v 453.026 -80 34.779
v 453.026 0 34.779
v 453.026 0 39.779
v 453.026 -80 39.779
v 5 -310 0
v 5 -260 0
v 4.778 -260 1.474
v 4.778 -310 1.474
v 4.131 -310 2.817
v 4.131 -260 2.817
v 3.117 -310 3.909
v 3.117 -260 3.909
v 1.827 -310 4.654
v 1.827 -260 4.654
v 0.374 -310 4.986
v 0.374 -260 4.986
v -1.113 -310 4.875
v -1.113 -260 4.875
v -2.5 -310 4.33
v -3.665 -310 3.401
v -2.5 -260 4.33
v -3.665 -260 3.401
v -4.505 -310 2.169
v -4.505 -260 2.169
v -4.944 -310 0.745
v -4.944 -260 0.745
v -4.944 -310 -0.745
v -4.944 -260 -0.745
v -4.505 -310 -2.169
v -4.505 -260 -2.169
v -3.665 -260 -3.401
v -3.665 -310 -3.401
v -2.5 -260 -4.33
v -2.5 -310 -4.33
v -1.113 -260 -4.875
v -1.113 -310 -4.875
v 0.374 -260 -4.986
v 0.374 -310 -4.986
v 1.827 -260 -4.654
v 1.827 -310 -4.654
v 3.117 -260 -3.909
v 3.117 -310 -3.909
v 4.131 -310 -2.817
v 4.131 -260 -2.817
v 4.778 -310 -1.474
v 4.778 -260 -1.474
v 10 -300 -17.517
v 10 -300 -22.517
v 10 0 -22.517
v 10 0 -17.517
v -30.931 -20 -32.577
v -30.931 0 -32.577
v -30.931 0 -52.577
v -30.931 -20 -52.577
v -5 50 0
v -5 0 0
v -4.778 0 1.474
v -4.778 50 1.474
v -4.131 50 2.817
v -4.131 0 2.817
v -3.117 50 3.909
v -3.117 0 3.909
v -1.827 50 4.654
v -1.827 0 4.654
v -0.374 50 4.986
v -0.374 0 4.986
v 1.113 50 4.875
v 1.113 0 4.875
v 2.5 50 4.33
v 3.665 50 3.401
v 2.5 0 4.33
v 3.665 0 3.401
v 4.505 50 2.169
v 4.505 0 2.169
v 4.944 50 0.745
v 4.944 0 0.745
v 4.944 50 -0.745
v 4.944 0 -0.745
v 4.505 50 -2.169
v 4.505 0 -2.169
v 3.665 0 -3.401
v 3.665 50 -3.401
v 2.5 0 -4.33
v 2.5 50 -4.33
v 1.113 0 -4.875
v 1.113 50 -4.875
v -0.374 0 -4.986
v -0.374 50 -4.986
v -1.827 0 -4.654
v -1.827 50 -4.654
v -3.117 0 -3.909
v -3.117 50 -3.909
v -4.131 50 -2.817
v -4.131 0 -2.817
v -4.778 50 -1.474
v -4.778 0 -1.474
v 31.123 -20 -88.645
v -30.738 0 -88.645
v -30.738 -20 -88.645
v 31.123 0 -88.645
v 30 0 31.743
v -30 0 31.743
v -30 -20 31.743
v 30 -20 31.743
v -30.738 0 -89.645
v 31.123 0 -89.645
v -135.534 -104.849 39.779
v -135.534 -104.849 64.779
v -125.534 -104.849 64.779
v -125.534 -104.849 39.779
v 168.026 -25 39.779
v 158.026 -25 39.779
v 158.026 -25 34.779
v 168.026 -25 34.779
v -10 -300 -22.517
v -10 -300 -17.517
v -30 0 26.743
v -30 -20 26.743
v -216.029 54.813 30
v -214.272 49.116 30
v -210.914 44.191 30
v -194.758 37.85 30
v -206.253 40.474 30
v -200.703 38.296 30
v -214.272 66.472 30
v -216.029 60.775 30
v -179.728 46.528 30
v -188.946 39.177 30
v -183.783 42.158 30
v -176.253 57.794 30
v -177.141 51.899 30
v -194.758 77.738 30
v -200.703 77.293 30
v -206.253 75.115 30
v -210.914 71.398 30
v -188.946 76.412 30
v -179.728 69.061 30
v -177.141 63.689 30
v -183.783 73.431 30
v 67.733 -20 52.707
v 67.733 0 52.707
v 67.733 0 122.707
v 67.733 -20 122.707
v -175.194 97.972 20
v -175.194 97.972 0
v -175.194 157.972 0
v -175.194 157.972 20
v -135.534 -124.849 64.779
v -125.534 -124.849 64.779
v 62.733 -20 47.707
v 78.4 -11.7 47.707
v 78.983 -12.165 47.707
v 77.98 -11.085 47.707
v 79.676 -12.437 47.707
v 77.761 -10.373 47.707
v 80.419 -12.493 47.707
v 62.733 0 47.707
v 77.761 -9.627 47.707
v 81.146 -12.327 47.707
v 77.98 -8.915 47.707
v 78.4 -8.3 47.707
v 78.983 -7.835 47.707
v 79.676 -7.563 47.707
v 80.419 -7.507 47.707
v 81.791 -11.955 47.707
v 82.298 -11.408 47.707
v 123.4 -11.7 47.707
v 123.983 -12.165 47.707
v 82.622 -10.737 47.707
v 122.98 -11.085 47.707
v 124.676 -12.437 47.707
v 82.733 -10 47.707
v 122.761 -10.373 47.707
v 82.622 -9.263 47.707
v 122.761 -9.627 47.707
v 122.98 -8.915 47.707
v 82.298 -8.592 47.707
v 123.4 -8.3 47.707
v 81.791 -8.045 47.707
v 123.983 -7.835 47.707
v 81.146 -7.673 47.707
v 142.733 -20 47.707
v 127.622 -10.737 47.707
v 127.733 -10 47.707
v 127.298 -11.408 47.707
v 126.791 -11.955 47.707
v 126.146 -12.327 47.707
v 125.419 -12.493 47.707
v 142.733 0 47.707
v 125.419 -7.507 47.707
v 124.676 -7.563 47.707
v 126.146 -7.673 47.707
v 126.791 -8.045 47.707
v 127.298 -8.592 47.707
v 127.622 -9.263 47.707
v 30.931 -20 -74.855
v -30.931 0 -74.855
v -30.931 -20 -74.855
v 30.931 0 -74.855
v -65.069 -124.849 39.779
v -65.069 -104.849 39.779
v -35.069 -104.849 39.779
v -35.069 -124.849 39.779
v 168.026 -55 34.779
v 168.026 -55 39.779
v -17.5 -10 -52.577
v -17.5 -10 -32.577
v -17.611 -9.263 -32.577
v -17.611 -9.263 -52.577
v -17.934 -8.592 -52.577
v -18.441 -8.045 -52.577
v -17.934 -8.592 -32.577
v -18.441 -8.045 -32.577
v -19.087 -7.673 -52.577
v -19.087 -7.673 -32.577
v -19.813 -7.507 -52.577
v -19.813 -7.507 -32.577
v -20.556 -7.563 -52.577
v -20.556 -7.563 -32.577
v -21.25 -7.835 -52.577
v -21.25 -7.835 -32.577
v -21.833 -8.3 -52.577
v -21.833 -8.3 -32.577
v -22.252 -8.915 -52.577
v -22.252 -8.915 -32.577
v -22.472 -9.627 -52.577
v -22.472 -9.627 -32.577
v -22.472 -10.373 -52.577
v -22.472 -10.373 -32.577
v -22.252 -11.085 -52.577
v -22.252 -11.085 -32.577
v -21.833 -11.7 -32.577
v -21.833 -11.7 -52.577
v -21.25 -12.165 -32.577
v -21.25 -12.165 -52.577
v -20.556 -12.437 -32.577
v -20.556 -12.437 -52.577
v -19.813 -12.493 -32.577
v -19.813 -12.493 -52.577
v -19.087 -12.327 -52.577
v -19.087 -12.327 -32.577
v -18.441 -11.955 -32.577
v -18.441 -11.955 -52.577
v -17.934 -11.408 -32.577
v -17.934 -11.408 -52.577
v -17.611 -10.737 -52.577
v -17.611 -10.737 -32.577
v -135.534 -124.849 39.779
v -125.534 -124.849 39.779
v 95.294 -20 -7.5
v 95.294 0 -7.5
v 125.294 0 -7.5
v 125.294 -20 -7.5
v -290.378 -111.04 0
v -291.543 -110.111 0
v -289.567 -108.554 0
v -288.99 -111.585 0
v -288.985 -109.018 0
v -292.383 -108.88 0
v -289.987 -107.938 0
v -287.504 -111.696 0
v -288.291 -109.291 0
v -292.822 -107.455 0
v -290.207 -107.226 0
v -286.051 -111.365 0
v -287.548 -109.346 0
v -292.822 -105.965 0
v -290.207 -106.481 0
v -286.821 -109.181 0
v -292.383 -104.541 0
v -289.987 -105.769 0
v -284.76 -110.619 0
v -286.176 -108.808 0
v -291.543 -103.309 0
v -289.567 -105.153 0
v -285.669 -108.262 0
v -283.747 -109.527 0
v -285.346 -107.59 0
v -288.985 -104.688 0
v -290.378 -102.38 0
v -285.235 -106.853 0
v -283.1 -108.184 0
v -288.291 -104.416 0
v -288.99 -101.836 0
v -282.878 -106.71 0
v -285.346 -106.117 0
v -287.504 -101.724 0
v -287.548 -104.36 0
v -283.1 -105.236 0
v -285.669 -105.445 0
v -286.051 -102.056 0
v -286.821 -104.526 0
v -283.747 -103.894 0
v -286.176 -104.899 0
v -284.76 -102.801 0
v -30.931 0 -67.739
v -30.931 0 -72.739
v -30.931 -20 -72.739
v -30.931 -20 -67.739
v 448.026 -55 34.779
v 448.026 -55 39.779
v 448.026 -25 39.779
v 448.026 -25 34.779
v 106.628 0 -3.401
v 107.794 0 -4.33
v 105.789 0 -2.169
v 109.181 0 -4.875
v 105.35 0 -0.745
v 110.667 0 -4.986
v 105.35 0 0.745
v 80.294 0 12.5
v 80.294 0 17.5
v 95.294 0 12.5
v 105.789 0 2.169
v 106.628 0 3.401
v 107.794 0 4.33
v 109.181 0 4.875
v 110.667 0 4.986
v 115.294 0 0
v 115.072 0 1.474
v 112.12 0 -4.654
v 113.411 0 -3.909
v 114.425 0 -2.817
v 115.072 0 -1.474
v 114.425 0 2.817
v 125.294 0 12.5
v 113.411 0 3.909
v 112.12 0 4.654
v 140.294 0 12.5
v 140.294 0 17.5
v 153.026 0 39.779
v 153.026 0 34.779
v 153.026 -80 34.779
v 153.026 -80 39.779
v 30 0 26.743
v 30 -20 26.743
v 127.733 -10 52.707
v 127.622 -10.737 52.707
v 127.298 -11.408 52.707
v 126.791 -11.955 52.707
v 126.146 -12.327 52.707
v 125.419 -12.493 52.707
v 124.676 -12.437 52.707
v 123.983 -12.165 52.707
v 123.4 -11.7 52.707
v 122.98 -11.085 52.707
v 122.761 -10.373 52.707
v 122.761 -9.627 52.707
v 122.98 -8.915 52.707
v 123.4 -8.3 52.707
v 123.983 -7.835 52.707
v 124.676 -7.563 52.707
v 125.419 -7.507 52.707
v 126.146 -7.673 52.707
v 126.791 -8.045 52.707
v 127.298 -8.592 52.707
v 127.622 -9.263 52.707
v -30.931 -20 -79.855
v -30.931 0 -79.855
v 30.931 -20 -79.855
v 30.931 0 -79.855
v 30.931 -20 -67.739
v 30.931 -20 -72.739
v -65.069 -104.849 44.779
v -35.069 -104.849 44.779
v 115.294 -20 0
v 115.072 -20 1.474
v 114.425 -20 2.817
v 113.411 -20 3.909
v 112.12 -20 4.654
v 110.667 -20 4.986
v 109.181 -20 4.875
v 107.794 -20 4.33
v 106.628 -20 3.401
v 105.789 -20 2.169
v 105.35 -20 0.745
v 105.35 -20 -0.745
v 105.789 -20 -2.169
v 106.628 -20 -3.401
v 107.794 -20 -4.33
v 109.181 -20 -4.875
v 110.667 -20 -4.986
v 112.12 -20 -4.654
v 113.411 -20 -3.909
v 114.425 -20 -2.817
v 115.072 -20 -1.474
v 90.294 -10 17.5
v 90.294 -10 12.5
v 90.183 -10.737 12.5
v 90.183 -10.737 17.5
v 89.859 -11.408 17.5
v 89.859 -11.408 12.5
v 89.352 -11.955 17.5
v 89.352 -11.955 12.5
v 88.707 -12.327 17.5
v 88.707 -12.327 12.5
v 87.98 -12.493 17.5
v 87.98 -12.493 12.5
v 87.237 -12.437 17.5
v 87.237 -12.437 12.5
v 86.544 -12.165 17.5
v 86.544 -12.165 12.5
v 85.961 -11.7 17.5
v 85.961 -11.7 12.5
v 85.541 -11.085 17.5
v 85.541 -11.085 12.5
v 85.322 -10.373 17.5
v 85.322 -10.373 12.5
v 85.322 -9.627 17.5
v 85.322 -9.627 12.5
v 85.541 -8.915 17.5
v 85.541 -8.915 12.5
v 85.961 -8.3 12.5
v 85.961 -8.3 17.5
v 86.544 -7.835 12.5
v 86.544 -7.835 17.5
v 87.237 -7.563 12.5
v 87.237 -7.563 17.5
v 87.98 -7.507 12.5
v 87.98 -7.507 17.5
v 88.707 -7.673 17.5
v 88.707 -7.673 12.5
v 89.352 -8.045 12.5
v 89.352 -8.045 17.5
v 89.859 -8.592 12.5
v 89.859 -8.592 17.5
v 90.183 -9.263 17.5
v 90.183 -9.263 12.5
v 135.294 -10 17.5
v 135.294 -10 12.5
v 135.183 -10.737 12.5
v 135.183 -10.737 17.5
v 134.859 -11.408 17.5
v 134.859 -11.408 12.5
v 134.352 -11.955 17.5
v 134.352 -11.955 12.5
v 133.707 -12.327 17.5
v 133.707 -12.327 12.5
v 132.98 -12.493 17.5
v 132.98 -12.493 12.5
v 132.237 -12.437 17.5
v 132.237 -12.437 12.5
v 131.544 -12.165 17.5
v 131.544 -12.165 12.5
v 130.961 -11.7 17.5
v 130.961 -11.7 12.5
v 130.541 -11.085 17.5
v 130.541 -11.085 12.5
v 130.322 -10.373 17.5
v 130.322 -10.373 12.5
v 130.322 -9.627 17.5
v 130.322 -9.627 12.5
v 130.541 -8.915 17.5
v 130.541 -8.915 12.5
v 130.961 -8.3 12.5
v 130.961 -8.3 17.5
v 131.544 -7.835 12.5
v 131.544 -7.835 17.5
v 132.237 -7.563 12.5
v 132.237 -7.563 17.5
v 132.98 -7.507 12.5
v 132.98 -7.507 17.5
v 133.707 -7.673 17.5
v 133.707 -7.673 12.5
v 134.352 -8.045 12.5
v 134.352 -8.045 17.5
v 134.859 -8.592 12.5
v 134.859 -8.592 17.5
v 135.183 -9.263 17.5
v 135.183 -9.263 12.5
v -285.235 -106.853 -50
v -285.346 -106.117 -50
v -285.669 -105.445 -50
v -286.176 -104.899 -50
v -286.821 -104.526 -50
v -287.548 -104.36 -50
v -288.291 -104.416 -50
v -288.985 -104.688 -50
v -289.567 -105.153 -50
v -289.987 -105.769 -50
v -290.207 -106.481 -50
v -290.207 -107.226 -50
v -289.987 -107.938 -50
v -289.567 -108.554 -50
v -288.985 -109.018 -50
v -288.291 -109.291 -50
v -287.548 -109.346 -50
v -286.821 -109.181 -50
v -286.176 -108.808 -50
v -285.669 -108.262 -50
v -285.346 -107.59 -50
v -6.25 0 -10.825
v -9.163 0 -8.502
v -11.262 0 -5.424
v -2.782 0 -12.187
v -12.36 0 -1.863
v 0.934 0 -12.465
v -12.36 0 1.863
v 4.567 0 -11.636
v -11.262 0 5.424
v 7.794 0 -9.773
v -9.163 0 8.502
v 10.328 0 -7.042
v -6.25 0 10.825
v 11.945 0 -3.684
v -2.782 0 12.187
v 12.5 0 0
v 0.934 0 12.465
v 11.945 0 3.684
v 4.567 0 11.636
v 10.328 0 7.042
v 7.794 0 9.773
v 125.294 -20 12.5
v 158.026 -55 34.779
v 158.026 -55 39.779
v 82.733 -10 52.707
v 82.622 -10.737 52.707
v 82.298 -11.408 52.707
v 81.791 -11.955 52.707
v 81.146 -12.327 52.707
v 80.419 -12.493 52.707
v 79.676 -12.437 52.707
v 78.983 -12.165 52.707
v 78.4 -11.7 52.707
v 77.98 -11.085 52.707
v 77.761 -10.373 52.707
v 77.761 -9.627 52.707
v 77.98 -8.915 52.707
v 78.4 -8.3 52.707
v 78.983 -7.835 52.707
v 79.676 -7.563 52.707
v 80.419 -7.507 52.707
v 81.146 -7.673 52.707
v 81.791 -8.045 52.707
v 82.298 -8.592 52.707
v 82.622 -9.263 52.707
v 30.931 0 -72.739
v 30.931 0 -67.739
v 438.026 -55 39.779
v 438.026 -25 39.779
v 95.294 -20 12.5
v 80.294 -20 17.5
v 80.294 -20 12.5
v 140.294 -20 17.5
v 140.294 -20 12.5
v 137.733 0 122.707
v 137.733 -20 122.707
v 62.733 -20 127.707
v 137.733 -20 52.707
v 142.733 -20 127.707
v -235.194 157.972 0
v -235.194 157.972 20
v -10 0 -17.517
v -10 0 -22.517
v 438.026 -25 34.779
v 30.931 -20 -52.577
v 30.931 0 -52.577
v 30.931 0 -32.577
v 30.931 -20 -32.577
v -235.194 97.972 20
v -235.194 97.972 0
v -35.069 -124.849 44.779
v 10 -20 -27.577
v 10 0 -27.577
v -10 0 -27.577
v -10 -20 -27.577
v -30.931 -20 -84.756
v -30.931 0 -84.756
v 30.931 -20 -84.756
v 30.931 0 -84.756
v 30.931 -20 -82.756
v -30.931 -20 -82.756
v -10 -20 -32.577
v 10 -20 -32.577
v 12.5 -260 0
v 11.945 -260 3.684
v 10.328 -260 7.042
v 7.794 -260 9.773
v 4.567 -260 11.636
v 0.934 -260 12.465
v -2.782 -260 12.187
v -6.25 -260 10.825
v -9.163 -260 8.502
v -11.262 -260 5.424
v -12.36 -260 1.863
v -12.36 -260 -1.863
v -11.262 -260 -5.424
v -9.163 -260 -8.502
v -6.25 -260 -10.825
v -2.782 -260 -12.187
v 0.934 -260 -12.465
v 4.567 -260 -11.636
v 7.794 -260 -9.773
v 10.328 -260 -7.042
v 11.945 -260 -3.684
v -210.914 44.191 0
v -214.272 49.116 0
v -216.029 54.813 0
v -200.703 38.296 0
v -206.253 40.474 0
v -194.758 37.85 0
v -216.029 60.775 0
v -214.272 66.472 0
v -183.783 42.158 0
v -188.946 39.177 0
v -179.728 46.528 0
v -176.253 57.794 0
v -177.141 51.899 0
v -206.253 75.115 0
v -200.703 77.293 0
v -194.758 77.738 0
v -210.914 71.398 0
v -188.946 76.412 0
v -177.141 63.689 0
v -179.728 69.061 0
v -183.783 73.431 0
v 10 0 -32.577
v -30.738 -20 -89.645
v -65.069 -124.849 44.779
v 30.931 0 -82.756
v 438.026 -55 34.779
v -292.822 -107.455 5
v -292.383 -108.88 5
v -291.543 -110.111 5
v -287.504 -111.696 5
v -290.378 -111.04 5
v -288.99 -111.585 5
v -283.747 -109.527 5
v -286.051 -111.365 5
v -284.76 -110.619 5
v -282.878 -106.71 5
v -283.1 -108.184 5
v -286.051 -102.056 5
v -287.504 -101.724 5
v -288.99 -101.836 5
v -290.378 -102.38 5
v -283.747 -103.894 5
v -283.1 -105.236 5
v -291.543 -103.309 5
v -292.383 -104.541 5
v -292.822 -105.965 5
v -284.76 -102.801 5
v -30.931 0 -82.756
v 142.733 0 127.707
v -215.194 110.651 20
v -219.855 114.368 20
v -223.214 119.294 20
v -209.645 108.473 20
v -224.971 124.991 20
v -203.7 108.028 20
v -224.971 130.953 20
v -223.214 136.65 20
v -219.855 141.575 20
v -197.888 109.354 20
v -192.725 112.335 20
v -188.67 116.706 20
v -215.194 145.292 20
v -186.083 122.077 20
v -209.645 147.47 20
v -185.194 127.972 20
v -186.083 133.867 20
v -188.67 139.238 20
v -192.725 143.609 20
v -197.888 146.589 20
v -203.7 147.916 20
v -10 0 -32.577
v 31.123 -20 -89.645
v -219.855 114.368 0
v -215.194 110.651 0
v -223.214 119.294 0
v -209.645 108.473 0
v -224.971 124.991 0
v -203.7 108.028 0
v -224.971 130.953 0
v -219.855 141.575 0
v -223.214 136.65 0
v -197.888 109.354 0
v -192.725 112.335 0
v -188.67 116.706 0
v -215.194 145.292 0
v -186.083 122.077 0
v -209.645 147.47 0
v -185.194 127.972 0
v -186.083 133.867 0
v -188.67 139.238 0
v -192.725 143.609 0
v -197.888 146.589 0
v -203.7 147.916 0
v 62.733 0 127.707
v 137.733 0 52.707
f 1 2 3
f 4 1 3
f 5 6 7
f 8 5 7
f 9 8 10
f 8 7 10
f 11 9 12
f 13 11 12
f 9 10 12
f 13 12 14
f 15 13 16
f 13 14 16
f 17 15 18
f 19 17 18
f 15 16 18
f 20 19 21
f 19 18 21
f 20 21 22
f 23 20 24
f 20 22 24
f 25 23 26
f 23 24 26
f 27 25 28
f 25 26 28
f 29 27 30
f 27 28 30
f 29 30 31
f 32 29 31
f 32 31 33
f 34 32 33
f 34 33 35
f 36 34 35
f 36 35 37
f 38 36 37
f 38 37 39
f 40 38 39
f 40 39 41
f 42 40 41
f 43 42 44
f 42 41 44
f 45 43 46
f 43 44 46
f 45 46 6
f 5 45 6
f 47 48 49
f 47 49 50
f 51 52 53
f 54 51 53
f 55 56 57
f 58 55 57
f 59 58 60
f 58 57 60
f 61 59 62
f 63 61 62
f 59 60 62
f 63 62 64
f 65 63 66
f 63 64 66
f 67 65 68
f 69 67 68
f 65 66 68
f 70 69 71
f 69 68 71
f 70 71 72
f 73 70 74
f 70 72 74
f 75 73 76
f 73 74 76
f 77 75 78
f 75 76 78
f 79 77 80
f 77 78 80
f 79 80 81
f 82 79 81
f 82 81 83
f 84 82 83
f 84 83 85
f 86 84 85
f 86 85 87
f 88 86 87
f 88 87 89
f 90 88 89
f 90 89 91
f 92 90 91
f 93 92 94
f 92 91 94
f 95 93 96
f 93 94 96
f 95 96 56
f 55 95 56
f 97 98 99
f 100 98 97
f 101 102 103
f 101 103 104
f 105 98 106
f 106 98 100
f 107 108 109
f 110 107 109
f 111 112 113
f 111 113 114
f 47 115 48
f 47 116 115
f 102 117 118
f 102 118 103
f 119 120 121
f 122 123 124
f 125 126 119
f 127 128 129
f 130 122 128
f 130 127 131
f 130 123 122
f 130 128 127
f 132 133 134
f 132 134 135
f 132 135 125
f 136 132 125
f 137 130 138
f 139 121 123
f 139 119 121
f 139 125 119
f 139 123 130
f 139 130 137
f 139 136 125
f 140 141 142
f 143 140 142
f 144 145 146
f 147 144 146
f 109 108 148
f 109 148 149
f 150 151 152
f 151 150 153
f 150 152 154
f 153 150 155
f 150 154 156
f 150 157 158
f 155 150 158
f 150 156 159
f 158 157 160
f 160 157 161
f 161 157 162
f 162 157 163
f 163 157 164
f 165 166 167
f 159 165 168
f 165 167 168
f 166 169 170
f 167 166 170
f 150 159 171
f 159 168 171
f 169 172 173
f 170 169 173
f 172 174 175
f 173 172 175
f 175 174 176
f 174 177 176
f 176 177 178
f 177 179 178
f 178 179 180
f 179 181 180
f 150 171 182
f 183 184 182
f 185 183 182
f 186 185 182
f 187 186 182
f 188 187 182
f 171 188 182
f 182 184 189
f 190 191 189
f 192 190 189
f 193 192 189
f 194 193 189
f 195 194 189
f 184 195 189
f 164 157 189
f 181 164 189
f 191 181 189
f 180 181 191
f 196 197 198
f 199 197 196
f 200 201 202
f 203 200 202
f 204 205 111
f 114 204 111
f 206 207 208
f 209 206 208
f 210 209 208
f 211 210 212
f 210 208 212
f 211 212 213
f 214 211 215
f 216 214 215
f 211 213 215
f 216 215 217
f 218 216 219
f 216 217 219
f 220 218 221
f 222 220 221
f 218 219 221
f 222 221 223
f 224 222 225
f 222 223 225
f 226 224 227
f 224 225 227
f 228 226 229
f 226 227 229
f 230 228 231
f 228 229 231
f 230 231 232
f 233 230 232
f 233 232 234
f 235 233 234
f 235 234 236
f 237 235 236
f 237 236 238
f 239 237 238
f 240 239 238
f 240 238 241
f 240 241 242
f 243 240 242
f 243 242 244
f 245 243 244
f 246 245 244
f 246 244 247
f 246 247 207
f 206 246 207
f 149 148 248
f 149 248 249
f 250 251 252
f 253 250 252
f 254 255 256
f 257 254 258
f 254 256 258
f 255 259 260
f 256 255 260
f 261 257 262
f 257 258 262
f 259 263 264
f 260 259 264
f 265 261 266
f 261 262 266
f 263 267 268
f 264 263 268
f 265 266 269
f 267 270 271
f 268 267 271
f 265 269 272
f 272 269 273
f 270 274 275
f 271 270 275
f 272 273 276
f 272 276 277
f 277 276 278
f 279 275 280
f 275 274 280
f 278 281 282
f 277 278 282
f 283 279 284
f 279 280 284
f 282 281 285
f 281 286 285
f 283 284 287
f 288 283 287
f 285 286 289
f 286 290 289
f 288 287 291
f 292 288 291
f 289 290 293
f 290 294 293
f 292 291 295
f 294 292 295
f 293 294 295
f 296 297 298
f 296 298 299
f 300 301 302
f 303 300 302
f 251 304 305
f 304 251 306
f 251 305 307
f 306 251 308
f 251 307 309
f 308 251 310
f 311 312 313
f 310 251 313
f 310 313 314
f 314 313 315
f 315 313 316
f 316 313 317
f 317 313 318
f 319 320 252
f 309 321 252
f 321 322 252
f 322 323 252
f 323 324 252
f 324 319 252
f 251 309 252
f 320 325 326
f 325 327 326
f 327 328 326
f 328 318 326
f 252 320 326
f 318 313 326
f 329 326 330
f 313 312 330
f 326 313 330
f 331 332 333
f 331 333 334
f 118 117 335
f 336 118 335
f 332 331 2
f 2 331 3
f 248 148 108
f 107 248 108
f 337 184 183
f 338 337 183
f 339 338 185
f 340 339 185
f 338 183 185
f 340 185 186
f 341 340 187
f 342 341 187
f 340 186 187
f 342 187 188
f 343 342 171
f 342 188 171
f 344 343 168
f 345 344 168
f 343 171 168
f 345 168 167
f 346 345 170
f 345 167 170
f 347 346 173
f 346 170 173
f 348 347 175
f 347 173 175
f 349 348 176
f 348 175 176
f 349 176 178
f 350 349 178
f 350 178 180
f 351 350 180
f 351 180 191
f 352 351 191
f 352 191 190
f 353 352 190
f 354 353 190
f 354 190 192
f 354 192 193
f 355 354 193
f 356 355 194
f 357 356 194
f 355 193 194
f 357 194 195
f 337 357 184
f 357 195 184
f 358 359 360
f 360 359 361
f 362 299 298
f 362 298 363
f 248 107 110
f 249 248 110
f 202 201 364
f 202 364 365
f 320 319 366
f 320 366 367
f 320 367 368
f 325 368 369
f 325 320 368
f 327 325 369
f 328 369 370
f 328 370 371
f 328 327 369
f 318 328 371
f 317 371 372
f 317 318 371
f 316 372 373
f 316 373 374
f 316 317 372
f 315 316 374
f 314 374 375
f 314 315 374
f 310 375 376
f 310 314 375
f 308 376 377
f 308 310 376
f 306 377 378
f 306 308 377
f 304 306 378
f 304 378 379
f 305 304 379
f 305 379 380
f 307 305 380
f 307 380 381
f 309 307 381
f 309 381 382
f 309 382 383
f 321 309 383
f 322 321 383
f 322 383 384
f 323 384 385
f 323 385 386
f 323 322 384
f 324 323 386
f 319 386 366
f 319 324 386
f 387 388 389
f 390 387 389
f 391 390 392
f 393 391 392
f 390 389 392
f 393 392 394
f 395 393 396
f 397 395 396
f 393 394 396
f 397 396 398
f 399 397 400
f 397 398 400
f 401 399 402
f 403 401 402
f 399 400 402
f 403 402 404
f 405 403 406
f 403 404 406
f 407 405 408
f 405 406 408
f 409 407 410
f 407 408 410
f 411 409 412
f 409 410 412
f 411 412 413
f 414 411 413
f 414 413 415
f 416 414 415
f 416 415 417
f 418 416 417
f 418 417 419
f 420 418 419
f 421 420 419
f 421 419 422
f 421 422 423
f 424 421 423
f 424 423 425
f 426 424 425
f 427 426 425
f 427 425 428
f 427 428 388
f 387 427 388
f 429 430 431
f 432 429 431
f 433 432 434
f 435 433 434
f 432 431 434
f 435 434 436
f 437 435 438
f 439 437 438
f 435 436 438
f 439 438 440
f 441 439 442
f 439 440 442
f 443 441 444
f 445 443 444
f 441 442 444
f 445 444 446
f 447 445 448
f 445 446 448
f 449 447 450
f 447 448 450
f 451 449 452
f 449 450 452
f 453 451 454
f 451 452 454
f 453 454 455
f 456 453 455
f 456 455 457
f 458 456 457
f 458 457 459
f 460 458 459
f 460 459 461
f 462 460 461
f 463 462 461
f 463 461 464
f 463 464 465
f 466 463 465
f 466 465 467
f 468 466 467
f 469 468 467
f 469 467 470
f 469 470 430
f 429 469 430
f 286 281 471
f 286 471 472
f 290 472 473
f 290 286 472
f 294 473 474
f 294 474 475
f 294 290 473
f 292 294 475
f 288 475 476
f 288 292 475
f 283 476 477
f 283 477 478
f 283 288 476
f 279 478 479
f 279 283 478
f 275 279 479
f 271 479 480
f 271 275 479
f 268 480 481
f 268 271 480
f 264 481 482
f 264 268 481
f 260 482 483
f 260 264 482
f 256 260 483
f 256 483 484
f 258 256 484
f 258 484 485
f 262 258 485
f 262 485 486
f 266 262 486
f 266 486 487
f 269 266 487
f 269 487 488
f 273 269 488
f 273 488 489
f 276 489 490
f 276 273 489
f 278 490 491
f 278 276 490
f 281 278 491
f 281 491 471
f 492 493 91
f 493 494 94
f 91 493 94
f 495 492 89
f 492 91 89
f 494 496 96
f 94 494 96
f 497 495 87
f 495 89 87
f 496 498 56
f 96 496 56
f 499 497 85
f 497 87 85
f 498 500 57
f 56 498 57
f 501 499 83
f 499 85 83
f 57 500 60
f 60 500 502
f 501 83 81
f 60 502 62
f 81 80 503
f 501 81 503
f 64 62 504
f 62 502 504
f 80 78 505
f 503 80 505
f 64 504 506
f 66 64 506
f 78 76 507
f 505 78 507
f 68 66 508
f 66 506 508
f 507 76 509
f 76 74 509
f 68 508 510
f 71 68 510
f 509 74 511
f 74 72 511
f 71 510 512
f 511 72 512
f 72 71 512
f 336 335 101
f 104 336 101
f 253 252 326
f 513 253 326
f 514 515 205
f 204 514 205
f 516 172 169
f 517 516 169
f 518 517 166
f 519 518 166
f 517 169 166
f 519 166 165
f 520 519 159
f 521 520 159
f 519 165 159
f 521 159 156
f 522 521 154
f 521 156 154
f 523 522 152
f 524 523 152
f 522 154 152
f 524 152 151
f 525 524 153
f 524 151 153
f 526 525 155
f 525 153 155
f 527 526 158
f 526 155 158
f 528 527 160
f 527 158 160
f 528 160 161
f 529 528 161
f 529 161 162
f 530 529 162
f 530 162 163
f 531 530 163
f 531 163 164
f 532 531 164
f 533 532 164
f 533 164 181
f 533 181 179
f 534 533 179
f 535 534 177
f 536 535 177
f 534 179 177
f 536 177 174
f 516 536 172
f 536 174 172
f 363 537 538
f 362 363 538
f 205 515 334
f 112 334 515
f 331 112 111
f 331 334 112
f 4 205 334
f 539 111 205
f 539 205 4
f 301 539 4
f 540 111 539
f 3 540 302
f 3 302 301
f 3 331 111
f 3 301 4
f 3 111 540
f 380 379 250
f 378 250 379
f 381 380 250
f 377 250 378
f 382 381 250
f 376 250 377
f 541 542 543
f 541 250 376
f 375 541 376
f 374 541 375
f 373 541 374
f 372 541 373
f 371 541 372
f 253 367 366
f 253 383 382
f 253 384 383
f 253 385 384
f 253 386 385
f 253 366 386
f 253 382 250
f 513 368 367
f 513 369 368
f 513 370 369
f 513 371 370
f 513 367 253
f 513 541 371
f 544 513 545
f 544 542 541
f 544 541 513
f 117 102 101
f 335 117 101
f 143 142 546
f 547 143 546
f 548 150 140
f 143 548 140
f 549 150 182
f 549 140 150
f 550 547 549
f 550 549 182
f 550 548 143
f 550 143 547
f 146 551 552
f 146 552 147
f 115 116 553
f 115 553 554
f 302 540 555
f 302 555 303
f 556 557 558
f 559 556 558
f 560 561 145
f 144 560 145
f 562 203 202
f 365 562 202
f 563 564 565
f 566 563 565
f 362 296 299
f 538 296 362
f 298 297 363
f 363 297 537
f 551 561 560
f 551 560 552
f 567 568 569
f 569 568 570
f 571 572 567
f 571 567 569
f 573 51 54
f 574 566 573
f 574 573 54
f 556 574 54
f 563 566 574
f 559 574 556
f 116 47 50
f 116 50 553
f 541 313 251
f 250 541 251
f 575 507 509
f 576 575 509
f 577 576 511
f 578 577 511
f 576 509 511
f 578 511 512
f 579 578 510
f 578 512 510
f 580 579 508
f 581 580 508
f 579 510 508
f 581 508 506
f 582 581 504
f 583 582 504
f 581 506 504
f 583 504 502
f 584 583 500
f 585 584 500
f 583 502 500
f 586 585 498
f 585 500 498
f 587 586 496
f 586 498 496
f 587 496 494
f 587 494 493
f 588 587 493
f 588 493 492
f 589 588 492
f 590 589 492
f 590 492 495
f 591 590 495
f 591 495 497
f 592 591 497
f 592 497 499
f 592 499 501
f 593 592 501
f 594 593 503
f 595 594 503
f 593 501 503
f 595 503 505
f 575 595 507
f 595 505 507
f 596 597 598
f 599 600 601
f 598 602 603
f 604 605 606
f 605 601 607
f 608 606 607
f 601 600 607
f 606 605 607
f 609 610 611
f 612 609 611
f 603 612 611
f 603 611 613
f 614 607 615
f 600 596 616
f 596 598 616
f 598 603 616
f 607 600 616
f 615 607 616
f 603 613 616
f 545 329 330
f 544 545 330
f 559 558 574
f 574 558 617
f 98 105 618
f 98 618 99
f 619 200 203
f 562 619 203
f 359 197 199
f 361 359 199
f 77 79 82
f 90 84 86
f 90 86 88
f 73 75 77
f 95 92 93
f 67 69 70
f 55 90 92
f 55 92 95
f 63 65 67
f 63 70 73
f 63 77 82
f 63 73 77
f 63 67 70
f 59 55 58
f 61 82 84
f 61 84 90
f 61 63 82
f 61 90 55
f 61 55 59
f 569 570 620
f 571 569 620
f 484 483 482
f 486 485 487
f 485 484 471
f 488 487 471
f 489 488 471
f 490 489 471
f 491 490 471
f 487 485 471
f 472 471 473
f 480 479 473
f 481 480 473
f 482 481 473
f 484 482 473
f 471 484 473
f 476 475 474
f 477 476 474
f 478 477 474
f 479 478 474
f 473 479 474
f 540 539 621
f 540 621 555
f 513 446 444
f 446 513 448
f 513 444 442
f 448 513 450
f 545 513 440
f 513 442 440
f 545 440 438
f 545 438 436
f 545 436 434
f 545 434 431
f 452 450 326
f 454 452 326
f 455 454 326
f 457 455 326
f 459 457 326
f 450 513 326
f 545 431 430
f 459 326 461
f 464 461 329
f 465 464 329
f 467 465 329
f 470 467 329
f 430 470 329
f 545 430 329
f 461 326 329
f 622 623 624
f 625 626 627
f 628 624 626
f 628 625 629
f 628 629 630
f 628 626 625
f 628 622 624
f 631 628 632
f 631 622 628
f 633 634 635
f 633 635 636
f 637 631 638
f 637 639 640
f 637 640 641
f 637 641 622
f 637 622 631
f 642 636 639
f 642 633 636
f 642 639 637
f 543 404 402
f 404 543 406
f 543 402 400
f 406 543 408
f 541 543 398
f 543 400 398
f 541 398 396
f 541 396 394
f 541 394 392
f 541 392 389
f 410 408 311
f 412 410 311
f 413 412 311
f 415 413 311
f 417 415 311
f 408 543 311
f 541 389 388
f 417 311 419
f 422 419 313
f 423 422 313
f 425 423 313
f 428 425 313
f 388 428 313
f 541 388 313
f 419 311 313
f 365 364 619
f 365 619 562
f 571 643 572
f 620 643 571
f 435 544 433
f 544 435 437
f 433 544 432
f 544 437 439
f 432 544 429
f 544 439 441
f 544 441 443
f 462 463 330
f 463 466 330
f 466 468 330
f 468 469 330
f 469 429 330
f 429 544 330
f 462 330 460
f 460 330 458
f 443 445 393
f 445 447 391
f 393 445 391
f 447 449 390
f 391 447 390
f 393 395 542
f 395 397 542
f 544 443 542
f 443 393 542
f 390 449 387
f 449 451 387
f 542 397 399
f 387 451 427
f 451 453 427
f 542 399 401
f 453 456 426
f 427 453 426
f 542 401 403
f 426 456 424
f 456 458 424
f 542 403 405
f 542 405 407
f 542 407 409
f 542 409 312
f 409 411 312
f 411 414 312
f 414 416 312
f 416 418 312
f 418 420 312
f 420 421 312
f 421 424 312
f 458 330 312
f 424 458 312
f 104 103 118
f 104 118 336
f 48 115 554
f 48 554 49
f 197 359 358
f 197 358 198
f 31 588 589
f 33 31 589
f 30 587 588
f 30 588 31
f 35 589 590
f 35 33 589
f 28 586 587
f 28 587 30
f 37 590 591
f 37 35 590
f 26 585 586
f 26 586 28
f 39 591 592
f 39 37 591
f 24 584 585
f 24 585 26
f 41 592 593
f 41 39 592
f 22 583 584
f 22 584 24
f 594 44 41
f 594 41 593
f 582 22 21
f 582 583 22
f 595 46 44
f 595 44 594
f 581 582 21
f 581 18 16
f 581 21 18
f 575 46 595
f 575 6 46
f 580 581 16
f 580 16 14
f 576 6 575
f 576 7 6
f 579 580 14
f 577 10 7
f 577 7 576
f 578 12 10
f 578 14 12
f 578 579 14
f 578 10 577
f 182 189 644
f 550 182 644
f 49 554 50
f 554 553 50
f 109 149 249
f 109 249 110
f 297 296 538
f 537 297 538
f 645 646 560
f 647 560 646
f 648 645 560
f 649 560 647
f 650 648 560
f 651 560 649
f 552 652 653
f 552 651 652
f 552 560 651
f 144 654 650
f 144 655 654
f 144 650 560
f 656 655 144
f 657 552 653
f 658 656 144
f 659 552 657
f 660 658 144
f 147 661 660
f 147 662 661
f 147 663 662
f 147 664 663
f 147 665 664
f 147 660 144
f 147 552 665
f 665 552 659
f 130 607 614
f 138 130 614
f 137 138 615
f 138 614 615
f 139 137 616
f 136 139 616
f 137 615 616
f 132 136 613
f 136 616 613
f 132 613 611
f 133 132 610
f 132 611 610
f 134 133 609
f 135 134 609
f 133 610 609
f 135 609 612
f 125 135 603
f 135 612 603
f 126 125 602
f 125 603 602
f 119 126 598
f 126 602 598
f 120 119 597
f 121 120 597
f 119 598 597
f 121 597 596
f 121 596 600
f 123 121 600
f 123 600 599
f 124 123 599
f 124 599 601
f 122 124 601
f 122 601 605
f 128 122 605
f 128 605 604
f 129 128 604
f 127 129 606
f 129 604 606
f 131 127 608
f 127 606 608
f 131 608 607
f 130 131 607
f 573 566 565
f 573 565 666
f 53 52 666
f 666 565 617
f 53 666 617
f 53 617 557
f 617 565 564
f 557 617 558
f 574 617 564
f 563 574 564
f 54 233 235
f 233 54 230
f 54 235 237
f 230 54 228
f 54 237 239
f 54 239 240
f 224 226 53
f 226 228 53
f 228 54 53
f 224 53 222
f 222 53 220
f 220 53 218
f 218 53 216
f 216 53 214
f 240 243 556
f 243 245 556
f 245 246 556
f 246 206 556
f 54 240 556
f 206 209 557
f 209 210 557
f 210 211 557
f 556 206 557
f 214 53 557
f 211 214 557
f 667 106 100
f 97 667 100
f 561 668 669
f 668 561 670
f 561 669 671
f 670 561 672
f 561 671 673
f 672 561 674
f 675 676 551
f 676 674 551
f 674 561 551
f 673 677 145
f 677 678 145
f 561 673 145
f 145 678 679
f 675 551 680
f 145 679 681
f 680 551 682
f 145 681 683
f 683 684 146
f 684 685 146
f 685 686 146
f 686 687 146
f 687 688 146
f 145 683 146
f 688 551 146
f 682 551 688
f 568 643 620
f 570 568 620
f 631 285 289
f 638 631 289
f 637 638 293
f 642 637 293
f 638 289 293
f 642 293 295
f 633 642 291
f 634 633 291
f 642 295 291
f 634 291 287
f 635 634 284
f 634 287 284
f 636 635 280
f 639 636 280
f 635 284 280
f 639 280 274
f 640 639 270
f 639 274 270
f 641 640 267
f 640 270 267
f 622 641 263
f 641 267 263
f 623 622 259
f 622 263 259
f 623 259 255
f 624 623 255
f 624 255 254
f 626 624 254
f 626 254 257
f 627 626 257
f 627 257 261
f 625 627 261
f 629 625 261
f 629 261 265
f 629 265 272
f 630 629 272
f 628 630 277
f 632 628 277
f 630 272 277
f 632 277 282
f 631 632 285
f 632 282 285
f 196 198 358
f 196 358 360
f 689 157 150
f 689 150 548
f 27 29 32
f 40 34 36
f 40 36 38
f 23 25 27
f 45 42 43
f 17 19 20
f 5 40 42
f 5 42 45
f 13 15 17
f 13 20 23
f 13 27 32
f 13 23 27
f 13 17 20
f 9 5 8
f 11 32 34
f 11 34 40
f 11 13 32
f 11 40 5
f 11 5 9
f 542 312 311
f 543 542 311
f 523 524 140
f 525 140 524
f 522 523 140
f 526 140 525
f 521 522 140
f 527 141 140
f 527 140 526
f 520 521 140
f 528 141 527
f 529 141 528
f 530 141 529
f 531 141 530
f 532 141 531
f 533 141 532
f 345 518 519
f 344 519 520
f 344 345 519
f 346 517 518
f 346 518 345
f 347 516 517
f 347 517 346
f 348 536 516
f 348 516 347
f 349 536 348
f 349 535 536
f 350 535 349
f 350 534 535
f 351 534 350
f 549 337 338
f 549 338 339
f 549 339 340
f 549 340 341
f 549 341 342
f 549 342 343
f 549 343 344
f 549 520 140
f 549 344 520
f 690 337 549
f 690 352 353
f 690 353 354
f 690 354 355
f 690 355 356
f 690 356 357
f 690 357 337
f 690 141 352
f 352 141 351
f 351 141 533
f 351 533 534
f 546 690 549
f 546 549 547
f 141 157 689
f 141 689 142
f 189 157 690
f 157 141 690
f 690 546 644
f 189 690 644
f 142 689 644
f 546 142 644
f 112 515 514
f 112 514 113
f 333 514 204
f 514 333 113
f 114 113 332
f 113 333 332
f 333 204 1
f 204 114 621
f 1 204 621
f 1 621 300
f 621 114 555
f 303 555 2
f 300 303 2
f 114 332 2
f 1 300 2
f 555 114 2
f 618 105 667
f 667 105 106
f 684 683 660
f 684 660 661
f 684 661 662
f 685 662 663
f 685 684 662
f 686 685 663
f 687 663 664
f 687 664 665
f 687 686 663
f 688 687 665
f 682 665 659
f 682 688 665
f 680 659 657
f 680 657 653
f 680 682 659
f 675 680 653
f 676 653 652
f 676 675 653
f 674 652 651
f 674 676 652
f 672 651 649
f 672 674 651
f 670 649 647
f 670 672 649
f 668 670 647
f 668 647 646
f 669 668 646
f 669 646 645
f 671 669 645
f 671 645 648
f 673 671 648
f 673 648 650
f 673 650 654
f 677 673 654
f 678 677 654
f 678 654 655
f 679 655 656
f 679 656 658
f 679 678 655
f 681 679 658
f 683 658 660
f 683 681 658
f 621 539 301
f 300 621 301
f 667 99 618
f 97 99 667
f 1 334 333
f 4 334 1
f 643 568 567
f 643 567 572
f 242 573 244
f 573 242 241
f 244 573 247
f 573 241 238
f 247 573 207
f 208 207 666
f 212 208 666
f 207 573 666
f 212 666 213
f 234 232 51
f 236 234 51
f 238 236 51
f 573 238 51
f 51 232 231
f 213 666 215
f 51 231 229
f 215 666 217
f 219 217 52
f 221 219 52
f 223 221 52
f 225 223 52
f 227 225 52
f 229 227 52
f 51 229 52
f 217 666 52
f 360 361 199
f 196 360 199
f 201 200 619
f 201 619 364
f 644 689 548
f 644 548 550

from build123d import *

# Parameters (mm, degrees)
F0_R      = 5
F1_DEPTH  = 20
F0_W      = 60
F0_H      = 5
F0_W_2    = 80
F0_H_2    = 80
F0_W_3    = 70
F0_H_3    = 70
F0_W_4    = 61.861140081
F0_H_4    = 1
F0_H_5    = 2
F0_R_2    = 12.5
F2_DEPTH  = 260
F3_R      = 5
F4_DEPTH  = 50
F5_DEPTH  = 300
F6_R      = 2.5
F7_DEPTH  = 25
F9_R      = 2.5
F8_R      = 2.5
F10_DEPTH = 25
F14_R     = 5
F15_DEPTH = 50
F16_W     = 300
F16_H     = 5
F17_DEPTH = 80
F19_R     = 20
F20_DEPTH = 30
F19_W     = 60
F19_H     = 60
F21_DEPTH = 20
F18_W     = 10
F18_H     = 30
F22_DEPTH = 129.4251411048
F18_H_2   = 20
F23_DEPTH = 25
F18_W_2   = 30
F24_DEPTH = 5
F13_R     = 2.5
F25_DEPTH = 5
F26_R     = 5
F27_DEPTH = 5
F28_R     = 2.5
F29_DEPTH = 50


# Not quite as in the source:
# - a feature of the source that left no trace in its solid (it failed there, or was rolled back) is left out
# - a feature names something its author has since deleted; it is built from what else it names


with BuildPart() as f1:
    # F0 (on Front) → F1 (new body)
    with BuildSketch(Plane.XZ):
        Polygon((95.2936565876, -7.5), (110.2936565876, -7.5), (125.2936565876, -7.5), (125.2936565876, 12.5), (140.2936565876, 12.5), (140.2936565876, 17.5), (110.2936565876, 17.5), (80.2936565876, 17.5), (80.2936565876, 12.5), (95.2936565876, 12.5), align=None)
        with Locations((110.2936565876, 0)):
            Circle(F0_R, mode=Mode.SUBTRACT)
    extrude(amount=F1_DEPTH)

    # F9 (on face) + F8 (on face) → F10 (cut)
    with BuildSketch(Plane(origin=(0, 0, 12.5), x_dir=(1, 0, 0), z_dir=(0, 0, -1))):
        with Locations((87.7936565876, 10)):
            Circle(F9_R)
    with BuildSketch(Plane(origin=(0, 0, 12.5), x_dir=(1, 0, 0), z_dir=(0, 0, -1))):
        with Locations((132.7936565876, 10)):
            Circle(F8_R)
    extrude(amount=-F10_DEPTH, mode=Mode.SUBTRACT)


with BuildPart() as f1b:
    # F0 (on Front) → F1, piece 2 (new body)
    with BuildSketch(Plane.XZ):
        with Locations((0, 29.2427036911)):
            Rectangle(F0_W, F0_H)
    extrude(amount=F1_DEPTH)


with BuildPart() as f1c:
    # F0 (on Front) → F1, piece 3 (new body)
    with BuildSketch(Plane.XZ):
        Polygon((10, -27.5771580637), (0, -27.5771580637), (-10, -27.5771580637), (-10, -32.5771580637), (-10.9305700405, -32.5771580637), (-30.9305700405, -32.5771580637), (-30.9305700405, -52.5771580637), (0, -52.5771580637), (30.9305700405, -52.5771580637), (30.9305700405, -32.5771580637), (10.9305700405, -32.5771580637), (10, -32.5771580637), align=None)
    extrude(amount=F1_DEPTH)

    # F6 (on face) → F7 (cut)
    with BuildSketch(Plane.XY.offset(-32.5771580637)):
        with Locations((-20, -10)):
            Circle(F6_R)
    extrude(amount=-F7_DEPTH, mode=Mode.SUBTRACT)


with BuildPart() as f1d:
    # F0 (on Front) → F1, piece 4 (new body)
    with BuildSketch(Plane.XZ):
        with Locations((102.7326732874, 87.7068325877)):
            Rectangle(F0_W_2, F0_H_2)
        with Locations((102.7326732874, 87.7068325877)):
            Rectangle(F0_W_3, F0_H_3, mode=Mode.SUBTRACT)
    extrude(amount=F1_DEPTH)

    # F13 (on face) → F25 (cut, through all)
    with BuildSketch(Plane(origin=(0, 0, 47.7068325877), x_dir=(1, 0, 0), z_dir=(0, 0, -1))):
        with Locations((125.2326732874, 10)):
            Circle(F13_R)
        with Locations((80.2326732874, 10)):
            Circle(F13_R)
    extrude(amount=-F25_DEPTH, mode=Mode.SUBTRACT)


with BuildPart() as f1e:
    # F0 (on Front) → F1, piece 5 (new body)
    with BuildSketch(Plane.XZ):
        with Locations((0, -77.355325222)):
            Rectangle(F0_W_4, F0_H)
    extrude(amount=F1_DEPTH)


with BuildPart() as f1f:
    # F0 (on Front) → F1, piece 6 (new body)
    with BuildSketch(Plane.XZ):
        with Locations((0.1928325291, -89.1451310813)):
            Rectangle(F0_W_4, F0_H_4)
    extrude(amount=F1_DEPTH)


with BuildPart() as f1g:
    # F0 (on Front) → F1, piece 7 (new body)
    with BuildSketch(Plane.XZ):
        with Locations((0, -83.756296128)):
            Rectangle(F0_W_4, F0_H_5)
    extrude(amount=F1_DEPTH)


with BuildPart() as f1h:
    # F0 (on Front) → F1, piece 8 (new body)
    with BuildSketch(Plane.XZ):
        with Locations((0, -70.2389810979)):
            Rectangle(F0_W_4, F0_H)
    extrude(amount=F1_DEPTH)


with BuildPart() as f2:
    # F0 (on Front) → F2 (new body)
    with BuildSketch(Plane.XZ):
        Circle(F0_R_2)
    extrude(amount=F2_DEPTH)

    # F3 (on face) → F4 (join)
    with BuildSketch(Plane.XZ.offset(260)):
        Circle(F3_R)
    extrude(amount=F4_DEPTH)

    # F14 (on face) → F15 (join)
    with BuildSketch(Plane(origin=(0, 0, 0), x_dir=(-1, 0, 0), z_dir=(0, 1, 0))):
        Circle(F14_R)
    extrude(amount=F15_DEPTH)


with BuildPart() as f5:
    # F0 (on Front) → F5 (new body)
    with BuildSketch(Plane.XZ):
        Polygon((-10, -22.5167013705), (0, -22.5167013705), (10, -22.5167013705), (10, -17.5167013705), (0, -17.5167013705), (-10, -17.5167013705), align=None)
    extrude(amount=F5_DEPTH)


with BuildPart() as f17:
    # F16 (on Front) → F17 (new body)
    with BuildSketch(Plane.XZ):
        with Locations((303.0256081372, 37.2790100235)):
            Rectangle(F16_W, F16_H)
    extrude(amount=F17_DEPTH)

    # F18 (on face) → F22 (cut, through all)
    with BuildSketch(Plane.XY.offset(39.7790100235)):
        with Locations((163.0256081372, -40)):
            Rectangle(F18_W, F18_H)
        with Locations((443.0256081372, -40)):
            Rectangle(F18_W, F18_H)
    extrude(amount=-F22_DEPTH, mode=Mode.SUBTRACT)


with BuildPart() as f20:
    # F19 (on Top) → F20 (new body)
    with BuildSketch(Plane.XY):
        with Locations((-196.2528675795, 57.794149965)):
            Circle(F19_R)
    extrude(amount=F20_DEPTH)


with BuildPart() as f21:
    # F19 (on Top) → F21 (new body)
    with BuildSketch(Plane.XY):
        with Locations((-205.1943850517, 127.9719012976)):
            Rectangle(F19_W, F19_H)
        with Locations((-205.1943850517, 127.9719012976)):
            Circle(F19_R, mode=Mode.SUBTRACT)
    extrude(amount=F21_DEPTH)


with BuildPart() as f23:
    # F18 (on face) → F23 (new body)
    with BuildSketch(Plane.XY.offset(39.7790100235)):
        with Locations((-130.5344802141, -114.8494374752)):
            Rectangle(F18_W, F18_H_2)
    extrude(amount=F23_DEPTH)


with BuildPart() as f24:
    # F18 (on face) → F24 (new body)
    with BuildSketch(Plane.XY.offset(39.7790100235)):
        with Locations((-50.0688782334, -114.8494374752)):
            Rectangle(F18_W_2, F18_H_2)
    extrude(amount=F24_DEPTH)


with BuildPart() as f27:
    # F26 (on Top) → F27 (new body)
    with BuildSketch(Plane.XY):
        with Locations((-287.8777384163, -106.7102653366)):
            Circle(F26_R)
    extrude(amount=F27_DEPTH)

    # F28 (on face) → F29 (join)
    with BuildSketch(Plane.XY):
        with Locations((-287.7346277237, -106.8533882499)):
            Circle(F28_R)
    extrude(amount=-F29_DEPTH)


solid = Compound([f1.part, f1b.part, f1c.part, f1d.part, f1e.part, f1f.part, f1g.part, f1h.part, f2.part, f5.part, f17.part, f20.part, f21.part, f23.part, f24.part, f27.part])
